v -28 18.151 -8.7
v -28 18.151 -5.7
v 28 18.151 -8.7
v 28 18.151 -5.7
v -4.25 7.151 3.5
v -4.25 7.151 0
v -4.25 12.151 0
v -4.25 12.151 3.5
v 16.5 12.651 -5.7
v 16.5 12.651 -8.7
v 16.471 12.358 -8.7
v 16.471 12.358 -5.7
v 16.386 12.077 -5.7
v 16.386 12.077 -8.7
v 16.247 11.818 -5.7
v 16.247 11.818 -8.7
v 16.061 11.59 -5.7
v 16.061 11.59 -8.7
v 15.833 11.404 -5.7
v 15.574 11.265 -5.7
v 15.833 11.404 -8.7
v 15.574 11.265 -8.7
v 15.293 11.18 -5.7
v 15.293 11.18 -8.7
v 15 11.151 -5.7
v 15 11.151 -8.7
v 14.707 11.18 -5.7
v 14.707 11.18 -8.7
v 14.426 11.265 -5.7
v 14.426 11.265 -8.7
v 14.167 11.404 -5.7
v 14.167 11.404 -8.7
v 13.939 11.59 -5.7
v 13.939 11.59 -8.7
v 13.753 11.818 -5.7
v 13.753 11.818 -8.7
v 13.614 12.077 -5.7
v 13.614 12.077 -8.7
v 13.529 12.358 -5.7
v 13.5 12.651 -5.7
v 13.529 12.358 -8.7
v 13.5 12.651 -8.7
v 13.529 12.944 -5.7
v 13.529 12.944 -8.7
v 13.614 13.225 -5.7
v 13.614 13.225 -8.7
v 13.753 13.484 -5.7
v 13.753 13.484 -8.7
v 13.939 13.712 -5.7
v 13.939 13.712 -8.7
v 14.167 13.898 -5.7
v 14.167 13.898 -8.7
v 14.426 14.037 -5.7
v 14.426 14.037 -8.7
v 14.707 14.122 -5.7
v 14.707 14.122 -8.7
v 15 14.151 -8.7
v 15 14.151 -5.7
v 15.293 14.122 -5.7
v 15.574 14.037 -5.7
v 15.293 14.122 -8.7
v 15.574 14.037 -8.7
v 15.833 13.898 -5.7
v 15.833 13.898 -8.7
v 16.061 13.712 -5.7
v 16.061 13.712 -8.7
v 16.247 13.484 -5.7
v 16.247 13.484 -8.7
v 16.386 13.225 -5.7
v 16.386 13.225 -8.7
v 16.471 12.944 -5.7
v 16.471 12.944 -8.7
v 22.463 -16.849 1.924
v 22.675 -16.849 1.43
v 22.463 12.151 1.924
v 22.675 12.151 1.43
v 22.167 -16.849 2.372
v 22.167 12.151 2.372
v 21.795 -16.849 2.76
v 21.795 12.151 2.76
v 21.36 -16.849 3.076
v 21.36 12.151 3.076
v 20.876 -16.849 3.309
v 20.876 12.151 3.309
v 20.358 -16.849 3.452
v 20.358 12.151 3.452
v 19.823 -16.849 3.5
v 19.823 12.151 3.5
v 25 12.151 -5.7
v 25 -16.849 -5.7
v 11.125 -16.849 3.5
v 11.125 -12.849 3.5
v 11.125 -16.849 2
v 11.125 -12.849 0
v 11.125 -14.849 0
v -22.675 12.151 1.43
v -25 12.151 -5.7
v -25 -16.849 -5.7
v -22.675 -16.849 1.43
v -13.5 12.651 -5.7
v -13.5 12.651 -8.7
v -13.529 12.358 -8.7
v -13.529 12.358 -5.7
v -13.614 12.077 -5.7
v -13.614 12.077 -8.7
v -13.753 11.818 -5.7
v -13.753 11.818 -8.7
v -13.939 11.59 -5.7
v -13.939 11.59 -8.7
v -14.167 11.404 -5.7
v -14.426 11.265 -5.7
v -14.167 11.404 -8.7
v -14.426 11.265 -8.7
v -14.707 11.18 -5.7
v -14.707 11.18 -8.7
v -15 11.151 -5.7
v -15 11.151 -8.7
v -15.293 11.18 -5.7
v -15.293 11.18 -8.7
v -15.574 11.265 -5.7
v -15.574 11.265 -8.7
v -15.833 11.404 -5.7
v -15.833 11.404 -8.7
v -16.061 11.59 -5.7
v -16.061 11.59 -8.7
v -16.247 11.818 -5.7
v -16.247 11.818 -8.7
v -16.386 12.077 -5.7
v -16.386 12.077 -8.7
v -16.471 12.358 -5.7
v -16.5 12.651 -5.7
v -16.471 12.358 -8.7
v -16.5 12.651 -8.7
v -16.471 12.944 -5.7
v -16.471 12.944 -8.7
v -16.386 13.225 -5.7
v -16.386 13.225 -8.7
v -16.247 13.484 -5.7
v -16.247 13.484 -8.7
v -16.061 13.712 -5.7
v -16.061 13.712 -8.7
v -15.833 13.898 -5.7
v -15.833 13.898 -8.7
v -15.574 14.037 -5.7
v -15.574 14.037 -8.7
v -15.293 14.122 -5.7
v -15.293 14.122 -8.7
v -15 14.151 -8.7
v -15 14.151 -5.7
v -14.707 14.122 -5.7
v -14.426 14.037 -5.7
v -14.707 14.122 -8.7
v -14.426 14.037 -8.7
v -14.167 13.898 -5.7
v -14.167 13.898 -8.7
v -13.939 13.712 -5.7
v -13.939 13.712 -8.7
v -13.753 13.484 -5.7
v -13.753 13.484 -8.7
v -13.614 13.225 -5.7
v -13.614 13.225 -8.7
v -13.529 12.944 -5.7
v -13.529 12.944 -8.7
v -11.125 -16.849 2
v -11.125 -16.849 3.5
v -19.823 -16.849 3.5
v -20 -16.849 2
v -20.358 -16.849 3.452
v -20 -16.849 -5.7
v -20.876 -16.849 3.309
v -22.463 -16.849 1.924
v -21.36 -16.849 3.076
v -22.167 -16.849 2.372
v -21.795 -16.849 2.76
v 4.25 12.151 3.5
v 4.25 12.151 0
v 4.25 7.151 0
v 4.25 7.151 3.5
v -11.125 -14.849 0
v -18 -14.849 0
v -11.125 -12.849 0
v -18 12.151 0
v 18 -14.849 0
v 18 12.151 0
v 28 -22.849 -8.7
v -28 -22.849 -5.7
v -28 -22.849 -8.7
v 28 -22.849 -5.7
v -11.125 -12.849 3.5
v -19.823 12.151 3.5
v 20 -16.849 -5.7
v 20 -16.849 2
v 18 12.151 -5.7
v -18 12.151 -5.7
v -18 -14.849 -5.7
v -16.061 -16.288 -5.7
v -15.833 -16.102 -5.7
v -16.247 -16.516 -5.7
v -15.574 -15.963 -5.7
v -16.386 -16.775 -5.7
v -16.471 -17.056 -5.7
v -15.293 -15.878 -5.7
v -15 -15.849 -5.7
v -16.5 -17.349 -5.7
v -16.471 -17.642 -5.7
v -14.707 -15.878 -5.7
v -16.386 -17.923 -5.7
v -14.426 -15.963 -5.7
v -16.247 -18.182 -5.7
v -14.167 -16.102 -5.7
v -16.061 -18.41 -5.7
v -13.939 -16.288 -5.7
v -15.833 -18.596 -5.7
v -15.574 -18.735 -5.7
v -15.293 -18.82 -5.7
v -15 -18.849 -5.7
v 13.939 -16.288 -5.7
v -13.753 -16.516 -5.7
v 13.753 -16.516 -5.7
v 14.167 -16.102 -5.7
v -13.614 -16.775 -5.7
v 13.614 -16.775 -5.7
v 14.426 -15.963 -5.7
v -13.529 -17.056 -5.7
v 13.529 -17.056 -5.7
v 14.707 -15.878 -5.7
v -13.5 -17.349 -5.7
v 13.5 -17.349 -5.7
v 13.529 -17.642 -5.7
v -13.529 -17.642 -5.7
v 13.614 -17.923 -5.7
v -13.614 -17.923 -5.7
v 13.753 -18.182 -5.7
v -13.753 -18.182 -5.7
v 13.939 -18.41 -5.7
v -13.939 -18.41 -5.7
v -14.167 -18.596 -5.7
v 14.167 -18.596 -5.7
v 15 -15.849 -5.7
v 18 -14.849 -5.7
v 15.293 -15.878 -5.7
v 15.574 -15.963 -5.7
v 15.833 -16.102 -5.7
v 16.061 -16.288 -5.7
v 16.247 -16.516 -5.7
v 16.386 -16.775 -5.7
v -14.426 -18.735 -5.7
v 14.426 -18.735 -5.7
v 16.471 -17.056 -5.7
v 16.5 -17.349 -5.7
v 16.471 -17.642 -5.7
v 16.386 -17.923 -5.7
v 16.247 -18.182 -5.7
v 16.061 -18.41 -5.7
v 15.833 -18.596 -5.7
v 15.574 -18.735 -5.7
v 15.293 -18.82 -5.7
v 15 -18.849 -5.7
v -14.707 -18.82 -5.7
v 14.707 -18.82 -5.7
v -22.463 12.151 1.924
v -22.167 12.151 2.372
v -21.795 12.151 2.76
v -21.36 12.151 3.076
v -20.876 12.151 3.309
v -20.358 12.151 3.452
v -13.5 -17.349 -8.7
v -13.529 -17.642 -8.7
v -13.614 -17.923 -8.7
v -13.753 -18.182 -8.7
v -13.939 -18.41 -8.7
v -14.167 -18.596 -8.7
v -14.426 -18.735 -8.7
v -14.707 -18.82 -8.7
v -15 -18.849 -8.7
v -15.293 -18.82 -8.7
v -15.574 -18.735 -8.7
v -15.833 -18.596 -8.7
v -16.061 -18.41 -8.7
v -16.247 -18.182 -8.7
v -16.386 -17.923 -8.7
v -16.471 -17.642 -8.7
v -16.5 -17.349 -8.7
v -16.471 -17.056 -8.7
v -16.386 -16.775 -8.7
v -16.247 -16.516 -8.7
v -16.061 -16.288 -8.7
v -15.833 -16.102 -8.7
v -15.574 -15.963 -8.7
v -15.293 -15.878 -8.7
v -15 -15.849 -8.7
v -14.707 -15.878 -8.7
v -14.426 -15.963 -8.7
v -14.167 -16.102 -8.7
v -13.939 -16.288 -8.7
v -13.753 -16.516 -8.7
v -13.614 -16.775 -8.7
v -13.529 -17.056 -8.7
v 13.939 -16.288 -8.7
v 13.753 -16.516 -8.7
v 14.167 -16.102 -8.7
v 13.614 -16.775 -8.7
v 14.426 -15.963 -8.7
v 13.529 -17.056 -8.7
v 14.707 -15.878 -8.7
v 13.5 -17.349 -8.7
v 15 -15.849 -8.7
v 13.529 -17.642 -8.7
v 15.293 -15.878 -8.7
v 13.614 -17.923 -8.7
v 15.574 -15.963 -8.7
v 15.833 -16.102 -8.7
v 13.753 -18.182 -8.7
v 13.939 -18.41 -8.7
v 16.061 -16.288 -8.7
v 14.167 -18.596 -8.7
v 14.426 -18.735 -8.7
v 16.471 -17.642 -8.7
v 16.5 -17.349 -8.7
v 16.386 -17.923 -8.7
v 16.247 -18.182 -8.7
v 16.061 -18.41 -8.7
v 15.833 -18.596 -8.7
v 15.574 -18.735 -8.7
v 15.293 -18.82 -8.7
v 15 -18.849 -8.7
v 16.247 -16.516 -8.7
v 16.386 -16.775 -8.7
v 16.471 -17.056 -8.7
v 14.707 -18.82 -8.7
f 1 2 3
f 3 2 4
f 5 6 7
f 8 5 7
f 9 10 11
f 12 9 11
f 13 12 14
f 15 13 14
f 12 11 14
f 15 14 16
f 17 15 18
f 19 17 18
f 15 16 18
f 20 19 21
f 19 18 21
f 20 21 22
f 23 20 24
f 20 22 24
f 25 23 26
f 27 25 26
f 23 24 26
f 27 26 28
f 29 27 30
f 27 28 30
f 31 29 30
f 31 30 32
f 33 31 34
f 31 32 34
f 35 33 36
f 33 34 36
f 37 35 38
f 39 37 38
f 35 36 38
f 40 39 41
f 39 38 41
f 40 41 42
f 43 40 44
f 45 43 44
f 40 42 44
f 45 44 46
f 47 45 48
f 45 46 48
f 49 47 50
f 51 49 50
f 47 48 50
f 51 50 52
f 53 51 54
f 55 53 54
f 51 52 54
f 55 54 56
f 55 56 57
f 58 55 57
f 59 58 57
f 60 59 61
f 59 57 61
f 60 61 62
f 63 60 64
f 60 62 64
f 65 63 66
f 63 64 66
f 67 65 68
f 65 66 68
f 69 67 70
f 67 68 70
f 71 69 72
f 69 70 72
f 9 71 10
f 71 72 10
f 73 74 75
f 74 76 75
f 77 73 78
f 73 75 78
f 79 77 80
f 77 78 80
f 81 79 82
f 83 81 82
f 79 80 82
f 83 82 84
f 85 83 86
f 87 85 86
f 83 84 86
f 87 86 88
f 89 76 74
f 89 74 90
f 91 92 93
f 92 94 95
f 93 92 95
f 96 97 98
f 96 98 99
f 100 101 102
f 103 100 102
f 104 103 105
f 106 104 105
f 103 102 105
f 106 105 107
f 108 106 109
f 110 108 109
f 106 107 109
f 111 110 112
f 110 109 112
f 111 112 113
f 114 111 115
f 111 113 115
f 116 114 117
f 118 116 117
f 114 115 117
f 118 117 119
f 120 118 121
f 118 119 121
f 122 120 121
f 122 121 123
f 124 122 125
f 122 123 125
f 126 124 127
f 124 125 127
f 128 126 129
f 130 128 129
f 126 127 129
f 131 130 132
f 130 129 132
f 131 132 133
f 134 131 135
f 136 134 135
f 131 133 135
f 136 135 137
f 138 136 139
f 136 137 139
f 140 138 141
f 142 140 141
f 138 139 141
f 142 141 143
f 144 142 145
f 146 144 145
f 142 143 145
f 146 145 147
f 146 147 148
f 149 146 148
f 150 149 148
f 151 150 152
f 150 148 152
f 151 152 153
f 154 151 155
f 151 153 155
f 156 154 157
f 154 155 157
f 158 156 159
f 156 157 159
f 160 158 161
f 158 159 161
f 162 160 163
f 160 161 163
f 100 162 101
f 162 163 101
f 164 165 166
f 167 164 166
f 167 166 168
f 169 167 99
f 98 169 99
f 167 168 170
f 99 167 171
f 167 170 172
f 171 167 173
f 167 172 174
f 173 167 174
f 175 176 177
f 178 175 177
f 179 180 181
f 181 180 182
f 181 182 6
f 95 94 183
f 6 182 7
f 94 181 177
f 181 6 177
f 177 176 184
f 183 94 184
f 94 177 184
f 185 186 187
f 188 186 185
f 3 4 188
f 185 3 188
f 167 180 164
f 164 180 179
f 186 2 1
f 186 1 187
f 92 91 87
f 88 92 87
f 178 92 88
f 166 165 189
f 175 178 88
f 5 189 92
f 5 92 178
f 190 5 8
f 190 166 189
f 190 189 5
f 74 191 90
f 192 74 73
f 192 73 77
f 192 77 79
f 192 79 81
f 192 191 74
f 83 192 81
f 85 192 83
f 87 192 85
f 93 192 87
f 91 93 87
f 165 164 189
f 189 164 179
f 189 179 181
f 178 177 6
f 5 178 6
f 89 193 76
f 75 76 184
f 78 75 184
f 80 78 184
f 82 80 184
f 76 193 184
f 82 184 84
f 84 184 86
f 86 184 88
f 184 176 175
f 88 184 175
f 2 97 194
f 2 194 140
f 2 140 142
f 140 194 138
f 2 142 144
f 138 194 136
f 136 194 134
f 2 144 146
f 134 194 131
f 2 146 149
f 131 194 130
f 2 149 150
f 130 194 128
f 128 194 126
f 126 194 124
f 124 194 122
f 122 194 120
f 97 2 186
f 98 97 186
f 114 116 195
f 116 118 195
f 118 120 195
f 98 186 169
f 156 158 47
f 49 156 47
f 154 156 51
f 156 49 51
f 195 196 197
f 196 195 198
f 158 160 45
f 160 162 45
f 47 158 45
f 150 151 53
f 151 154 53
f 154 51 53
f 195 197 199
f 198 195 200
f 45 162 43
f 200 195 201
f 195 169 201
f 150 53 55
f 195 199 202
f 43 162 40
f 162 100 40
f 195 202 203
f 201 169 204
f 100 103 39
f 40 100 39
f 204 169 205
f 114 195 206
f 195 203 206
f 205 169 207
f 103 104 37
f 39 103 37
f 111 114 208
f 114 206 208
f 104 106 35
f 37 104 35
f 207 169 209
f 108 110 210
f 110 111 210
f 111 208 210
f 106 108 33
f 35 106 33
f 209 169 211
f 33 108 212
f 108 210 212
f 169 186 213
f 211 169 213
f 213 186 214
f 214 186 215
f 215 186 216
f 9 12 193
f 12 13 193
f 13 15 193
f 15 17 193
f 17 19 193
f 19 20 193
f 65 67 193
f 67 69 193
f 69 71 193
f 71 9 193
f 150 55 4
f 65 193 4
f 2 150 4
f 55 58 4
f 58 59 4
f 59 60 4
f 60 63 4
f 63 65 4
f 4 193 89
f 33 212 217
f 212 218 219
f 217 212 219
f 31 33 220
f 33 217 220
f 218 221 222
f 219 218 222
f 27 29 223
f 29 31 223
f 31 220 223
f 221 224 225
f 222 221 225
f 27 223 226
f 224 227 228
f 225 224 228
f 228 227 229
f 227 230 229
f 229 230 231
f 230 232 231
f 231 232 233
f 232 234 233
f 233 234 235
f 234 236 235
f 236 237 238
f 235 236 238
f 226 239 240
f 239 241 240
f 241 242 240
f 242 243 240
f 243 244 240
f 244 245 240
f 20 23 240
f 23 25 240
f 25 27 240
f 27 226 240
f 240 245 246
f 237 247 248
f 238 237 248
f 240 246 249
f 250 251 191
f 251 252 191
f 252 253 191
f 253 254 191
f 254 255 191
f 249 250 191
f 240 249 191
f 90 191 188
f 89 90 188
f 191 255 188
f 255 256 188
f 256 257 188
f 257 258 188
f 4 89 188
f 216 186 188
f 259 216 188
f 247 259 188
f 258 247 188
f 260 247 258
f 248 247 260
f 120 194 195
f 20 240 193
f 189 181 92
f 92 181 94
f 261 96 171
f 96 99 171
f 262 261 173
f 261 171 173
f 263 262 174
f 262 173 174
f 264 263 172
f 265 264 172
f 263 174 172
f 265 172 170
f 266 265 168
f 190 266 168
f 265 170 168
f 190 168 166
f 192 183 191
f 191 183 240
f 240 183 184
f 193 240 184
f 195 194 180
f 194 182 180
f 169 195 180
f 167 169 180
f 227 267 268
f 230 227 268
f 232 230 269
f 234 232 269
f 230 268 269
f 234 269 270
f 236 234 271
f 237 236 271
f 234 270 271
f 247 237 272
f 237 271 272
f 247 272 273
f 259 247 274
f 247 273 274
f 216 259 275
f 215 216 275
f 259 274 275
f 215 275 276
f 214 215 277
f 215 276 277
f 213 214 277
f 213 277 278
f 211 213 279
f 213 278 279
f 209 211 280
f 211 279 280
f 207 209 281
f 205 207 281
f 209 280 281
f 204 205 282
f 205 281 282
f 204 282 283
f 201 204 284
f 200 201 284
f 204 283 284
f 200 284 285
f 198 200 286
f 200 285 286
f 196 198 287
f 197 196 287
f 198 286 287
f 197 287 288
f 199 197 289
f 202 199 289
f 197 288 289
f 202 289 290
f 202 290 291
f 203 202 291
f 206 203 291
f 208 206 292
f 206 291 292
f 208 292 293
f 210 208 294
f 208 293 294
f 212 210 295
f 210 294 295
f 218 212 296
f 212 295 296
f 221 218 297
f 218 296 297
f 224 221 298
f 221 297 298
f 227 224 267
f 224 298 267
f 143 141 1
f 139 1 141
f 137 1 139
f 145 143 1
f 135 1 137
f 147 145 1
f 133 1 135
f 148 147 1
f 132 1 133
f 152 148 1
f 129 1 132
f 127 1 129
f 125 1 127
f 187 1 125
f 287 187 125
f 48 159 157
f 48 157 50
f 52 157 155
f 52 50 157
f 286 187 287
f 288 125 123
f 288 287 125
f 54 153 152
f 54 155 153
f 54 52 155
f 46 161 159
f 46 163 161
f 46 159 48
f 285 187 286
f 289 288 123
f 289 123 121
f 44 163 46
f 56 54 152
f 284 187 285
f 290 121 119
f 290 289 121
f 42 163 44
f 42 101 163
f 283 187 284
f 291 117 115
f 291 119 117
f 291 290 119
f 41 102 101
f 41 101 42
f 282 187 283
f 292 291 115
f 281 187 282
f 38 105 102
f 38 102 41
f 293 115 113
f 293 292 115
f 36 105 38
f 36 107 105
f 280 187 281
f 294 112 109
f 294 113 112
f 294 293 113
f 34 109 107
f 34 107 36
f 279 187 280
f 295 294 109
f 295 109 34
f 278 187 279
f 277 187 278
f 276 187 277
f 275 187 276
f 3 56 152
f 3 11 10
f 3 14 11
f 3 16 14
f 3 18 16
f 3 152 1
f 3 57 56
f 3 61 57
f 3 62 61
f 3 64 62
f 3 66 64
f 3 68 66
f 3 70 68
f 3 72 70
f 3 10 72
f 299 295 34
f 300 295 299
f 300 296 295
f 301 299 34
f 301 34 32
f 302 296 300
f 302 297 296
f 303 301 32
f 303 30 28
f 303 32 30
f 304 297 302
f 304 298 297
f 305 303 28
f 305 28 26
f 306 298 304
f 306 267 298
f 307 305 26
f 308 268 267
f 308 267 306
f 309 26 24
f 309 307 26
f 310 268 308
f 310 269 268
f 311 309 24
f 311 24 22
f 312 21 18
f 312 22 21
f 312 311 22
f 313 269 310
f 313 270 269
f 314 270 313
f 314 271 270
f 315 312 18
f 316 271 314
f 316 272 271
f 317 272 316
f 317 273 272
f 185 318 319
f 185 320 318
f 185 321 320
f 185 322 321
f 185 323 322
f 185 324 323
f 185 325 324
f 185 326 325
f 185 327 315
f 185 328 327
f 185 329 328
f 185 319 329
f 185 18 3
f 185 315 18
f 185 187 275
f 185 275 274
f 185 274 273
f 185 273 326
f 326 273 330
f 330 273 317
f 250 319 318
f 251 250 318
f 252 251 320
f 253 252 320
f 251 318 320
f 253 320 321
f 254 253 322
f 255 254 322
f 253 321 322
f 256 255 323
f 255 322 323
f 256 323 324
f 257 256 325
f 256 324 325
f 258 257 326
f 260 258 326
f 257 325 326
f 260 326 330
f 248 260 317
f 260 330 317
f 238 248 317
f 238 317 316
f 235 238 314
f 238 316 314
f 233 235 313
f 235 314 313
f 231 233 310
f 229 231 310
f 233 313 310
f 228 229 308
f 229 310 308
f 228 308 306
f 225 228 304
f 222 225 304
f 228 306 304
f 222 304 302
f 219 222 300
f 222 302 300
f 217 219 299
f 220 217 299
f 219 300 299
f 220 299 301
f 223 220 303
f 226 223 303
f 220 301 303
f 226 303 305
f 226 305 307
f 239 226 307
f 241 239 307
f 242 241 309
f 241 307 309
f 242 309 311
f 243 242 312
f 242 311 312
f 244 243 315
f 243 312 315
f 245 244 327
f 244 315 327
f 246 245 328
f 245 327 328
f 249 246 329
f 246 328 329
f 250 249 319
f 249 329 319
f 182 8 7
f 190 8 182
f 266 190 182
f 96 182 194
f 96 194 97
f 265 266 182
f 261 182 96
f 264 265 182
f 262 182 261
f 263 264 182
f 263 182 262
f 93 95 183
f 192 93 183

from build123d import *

# Parameters (mm, degrees)
F1_DEPTH  = 3.5
F2_W      = 29
F2_H      = 9.2
F3_DEPTH  = 4
F4_W      = 29
F4_H      = 9.2
F5_DEPTH  = 4
F6_SIZE   = 2
F7_W      = 4
F7_H      = 15
F8_DEPTH  = 3
F9_SIZE   = 2
F11_DEPTH = 29
F12_R     = 3
F13_W     = 56
F13_H     = 41
F14_DEPTH = 3
F15_R     = 1.5
F16_DEPTH = 3


with BuildPart() as f1:
    # F0 (on Top) → F1 (new body)
    with BuildSketch(Plane.XY):
        Polygon((-4.25, 12.1511180716), (-18, 12.1511180716), (-18, -16.8488819284), (-11.125, -16.8488819284), (-11.125, -12.8488819284), (11.125, -12.8488819284), (11.125, -16.8488819284), (18, -16.8488819284), (18, 12.1511180716), (4.25, 12.1511180716), (4.25, 7.1511180716), (-4.25, 7.1511180716), align=None)
    extrude(amount=F1_DEPTH)

    # F2 (on face) → F3 (join)
    with BuildSketch(Plane(origin=(-18, 0, 0), x_dir=(0, -1, 0), z_dir=(-1, 0, 0))):
        with Locations((2.3488819284, -1.1)):
            Rectangle(F2_W, F2_H)
    extrude(amount=F3_DEPTH)

    # F4 (on face) → F5 (join)
    with BuildSketch(Plane.YZ.offset(18)):
        with Locations((-2.3488819284, -1.1)):
            Rectangle(F4_W, F4_H)
    extrude(amount=F5_DEPTH)

    # F6
    f6_edges = [f1.edges().sort_by_distance(p)[0] for p in [
        (-14.5625, -16.848882, 0),
        (14.5625, -16.848882, 0),
    ]]
    chamfer(f6_edges, length=F6_SIZE)

    # F7 (on face) → F8 (join)
    with BuildSketch(Plane(origin=(0, 0, -5.7), x_dir=(1, 0, 0), z_dir=(0, 0, -1))):
        with Locations((20, 2.3488819284)):
            Rectangle(F7_W, F7_H)
        with Locations((-20, 2.3488819284)):
            Rectangle(F7_W, F7_H)
    extrude(amount=F8_DEPTH)

    # F9
    f9_edges = [f1.edges().sort_by_distance(p)[0] for p in [
        (18, -16.848882, -1.85),
        (-18, -16.848882, -1.85),
    ]]
    chamfer(f9_edges, length=F9_SIZE)

    # F10 (on face) → F11 (join, through all)
    with BuildSketch(Plane(origin=(0, 12.1511180716, 0), x_dir=(-1, 0, 0), z_dir=(0, 1, 0))):
        Polygon((25, -5.7), (22, 3.5), (22, -5.7), align=None)
        Polygon((-22, -5.7), (-22, 3.5), (-25, -5.7), align=None)
    extrude(amount=-F11_DEPTH)

    # F12
    f12_edges = [f1.edges().sort_by_distance(p)[0] for p in [
        (-22, -2.348882, 3.5),
        (22, -2.348882, 3.5),
    ]]
    fillet(f12_edges, radius=F12_R)

    # F13 (on face) → F14 (join, through all)
    with BuildSketch(Plane(origin=(0, 0, -5.7), x_dir=(1, 0, 0), z_dir=(0, 0, -1))):
        with Locations((0, 2.3488819284)):
            Rectangle(F13_W, F13_H)
    extrude(amount=F14_DEPTH)

    # F15 (on face) → F16 (cut, through all)
    with BuildSketch(Plane(origin=(0, 0, -8.7), x_dir=(1, 0, 0), z_dir=(0, 0, -1))):
        with Locations((-15, 17.3488819284)):
            Circle(F15_R)
        with Locations((15, 17.3488819284)):
            Circle(F15_R)
        with Locations((15, -12.6511180716)):
            Circle(F15_R)
        with Locations((-15, -12.6511180716)):
            Circle(F15_R)
    extrude(amount=-F16_DEPTH, mode=Mode.SUBTRACT)


solid = f1.part
